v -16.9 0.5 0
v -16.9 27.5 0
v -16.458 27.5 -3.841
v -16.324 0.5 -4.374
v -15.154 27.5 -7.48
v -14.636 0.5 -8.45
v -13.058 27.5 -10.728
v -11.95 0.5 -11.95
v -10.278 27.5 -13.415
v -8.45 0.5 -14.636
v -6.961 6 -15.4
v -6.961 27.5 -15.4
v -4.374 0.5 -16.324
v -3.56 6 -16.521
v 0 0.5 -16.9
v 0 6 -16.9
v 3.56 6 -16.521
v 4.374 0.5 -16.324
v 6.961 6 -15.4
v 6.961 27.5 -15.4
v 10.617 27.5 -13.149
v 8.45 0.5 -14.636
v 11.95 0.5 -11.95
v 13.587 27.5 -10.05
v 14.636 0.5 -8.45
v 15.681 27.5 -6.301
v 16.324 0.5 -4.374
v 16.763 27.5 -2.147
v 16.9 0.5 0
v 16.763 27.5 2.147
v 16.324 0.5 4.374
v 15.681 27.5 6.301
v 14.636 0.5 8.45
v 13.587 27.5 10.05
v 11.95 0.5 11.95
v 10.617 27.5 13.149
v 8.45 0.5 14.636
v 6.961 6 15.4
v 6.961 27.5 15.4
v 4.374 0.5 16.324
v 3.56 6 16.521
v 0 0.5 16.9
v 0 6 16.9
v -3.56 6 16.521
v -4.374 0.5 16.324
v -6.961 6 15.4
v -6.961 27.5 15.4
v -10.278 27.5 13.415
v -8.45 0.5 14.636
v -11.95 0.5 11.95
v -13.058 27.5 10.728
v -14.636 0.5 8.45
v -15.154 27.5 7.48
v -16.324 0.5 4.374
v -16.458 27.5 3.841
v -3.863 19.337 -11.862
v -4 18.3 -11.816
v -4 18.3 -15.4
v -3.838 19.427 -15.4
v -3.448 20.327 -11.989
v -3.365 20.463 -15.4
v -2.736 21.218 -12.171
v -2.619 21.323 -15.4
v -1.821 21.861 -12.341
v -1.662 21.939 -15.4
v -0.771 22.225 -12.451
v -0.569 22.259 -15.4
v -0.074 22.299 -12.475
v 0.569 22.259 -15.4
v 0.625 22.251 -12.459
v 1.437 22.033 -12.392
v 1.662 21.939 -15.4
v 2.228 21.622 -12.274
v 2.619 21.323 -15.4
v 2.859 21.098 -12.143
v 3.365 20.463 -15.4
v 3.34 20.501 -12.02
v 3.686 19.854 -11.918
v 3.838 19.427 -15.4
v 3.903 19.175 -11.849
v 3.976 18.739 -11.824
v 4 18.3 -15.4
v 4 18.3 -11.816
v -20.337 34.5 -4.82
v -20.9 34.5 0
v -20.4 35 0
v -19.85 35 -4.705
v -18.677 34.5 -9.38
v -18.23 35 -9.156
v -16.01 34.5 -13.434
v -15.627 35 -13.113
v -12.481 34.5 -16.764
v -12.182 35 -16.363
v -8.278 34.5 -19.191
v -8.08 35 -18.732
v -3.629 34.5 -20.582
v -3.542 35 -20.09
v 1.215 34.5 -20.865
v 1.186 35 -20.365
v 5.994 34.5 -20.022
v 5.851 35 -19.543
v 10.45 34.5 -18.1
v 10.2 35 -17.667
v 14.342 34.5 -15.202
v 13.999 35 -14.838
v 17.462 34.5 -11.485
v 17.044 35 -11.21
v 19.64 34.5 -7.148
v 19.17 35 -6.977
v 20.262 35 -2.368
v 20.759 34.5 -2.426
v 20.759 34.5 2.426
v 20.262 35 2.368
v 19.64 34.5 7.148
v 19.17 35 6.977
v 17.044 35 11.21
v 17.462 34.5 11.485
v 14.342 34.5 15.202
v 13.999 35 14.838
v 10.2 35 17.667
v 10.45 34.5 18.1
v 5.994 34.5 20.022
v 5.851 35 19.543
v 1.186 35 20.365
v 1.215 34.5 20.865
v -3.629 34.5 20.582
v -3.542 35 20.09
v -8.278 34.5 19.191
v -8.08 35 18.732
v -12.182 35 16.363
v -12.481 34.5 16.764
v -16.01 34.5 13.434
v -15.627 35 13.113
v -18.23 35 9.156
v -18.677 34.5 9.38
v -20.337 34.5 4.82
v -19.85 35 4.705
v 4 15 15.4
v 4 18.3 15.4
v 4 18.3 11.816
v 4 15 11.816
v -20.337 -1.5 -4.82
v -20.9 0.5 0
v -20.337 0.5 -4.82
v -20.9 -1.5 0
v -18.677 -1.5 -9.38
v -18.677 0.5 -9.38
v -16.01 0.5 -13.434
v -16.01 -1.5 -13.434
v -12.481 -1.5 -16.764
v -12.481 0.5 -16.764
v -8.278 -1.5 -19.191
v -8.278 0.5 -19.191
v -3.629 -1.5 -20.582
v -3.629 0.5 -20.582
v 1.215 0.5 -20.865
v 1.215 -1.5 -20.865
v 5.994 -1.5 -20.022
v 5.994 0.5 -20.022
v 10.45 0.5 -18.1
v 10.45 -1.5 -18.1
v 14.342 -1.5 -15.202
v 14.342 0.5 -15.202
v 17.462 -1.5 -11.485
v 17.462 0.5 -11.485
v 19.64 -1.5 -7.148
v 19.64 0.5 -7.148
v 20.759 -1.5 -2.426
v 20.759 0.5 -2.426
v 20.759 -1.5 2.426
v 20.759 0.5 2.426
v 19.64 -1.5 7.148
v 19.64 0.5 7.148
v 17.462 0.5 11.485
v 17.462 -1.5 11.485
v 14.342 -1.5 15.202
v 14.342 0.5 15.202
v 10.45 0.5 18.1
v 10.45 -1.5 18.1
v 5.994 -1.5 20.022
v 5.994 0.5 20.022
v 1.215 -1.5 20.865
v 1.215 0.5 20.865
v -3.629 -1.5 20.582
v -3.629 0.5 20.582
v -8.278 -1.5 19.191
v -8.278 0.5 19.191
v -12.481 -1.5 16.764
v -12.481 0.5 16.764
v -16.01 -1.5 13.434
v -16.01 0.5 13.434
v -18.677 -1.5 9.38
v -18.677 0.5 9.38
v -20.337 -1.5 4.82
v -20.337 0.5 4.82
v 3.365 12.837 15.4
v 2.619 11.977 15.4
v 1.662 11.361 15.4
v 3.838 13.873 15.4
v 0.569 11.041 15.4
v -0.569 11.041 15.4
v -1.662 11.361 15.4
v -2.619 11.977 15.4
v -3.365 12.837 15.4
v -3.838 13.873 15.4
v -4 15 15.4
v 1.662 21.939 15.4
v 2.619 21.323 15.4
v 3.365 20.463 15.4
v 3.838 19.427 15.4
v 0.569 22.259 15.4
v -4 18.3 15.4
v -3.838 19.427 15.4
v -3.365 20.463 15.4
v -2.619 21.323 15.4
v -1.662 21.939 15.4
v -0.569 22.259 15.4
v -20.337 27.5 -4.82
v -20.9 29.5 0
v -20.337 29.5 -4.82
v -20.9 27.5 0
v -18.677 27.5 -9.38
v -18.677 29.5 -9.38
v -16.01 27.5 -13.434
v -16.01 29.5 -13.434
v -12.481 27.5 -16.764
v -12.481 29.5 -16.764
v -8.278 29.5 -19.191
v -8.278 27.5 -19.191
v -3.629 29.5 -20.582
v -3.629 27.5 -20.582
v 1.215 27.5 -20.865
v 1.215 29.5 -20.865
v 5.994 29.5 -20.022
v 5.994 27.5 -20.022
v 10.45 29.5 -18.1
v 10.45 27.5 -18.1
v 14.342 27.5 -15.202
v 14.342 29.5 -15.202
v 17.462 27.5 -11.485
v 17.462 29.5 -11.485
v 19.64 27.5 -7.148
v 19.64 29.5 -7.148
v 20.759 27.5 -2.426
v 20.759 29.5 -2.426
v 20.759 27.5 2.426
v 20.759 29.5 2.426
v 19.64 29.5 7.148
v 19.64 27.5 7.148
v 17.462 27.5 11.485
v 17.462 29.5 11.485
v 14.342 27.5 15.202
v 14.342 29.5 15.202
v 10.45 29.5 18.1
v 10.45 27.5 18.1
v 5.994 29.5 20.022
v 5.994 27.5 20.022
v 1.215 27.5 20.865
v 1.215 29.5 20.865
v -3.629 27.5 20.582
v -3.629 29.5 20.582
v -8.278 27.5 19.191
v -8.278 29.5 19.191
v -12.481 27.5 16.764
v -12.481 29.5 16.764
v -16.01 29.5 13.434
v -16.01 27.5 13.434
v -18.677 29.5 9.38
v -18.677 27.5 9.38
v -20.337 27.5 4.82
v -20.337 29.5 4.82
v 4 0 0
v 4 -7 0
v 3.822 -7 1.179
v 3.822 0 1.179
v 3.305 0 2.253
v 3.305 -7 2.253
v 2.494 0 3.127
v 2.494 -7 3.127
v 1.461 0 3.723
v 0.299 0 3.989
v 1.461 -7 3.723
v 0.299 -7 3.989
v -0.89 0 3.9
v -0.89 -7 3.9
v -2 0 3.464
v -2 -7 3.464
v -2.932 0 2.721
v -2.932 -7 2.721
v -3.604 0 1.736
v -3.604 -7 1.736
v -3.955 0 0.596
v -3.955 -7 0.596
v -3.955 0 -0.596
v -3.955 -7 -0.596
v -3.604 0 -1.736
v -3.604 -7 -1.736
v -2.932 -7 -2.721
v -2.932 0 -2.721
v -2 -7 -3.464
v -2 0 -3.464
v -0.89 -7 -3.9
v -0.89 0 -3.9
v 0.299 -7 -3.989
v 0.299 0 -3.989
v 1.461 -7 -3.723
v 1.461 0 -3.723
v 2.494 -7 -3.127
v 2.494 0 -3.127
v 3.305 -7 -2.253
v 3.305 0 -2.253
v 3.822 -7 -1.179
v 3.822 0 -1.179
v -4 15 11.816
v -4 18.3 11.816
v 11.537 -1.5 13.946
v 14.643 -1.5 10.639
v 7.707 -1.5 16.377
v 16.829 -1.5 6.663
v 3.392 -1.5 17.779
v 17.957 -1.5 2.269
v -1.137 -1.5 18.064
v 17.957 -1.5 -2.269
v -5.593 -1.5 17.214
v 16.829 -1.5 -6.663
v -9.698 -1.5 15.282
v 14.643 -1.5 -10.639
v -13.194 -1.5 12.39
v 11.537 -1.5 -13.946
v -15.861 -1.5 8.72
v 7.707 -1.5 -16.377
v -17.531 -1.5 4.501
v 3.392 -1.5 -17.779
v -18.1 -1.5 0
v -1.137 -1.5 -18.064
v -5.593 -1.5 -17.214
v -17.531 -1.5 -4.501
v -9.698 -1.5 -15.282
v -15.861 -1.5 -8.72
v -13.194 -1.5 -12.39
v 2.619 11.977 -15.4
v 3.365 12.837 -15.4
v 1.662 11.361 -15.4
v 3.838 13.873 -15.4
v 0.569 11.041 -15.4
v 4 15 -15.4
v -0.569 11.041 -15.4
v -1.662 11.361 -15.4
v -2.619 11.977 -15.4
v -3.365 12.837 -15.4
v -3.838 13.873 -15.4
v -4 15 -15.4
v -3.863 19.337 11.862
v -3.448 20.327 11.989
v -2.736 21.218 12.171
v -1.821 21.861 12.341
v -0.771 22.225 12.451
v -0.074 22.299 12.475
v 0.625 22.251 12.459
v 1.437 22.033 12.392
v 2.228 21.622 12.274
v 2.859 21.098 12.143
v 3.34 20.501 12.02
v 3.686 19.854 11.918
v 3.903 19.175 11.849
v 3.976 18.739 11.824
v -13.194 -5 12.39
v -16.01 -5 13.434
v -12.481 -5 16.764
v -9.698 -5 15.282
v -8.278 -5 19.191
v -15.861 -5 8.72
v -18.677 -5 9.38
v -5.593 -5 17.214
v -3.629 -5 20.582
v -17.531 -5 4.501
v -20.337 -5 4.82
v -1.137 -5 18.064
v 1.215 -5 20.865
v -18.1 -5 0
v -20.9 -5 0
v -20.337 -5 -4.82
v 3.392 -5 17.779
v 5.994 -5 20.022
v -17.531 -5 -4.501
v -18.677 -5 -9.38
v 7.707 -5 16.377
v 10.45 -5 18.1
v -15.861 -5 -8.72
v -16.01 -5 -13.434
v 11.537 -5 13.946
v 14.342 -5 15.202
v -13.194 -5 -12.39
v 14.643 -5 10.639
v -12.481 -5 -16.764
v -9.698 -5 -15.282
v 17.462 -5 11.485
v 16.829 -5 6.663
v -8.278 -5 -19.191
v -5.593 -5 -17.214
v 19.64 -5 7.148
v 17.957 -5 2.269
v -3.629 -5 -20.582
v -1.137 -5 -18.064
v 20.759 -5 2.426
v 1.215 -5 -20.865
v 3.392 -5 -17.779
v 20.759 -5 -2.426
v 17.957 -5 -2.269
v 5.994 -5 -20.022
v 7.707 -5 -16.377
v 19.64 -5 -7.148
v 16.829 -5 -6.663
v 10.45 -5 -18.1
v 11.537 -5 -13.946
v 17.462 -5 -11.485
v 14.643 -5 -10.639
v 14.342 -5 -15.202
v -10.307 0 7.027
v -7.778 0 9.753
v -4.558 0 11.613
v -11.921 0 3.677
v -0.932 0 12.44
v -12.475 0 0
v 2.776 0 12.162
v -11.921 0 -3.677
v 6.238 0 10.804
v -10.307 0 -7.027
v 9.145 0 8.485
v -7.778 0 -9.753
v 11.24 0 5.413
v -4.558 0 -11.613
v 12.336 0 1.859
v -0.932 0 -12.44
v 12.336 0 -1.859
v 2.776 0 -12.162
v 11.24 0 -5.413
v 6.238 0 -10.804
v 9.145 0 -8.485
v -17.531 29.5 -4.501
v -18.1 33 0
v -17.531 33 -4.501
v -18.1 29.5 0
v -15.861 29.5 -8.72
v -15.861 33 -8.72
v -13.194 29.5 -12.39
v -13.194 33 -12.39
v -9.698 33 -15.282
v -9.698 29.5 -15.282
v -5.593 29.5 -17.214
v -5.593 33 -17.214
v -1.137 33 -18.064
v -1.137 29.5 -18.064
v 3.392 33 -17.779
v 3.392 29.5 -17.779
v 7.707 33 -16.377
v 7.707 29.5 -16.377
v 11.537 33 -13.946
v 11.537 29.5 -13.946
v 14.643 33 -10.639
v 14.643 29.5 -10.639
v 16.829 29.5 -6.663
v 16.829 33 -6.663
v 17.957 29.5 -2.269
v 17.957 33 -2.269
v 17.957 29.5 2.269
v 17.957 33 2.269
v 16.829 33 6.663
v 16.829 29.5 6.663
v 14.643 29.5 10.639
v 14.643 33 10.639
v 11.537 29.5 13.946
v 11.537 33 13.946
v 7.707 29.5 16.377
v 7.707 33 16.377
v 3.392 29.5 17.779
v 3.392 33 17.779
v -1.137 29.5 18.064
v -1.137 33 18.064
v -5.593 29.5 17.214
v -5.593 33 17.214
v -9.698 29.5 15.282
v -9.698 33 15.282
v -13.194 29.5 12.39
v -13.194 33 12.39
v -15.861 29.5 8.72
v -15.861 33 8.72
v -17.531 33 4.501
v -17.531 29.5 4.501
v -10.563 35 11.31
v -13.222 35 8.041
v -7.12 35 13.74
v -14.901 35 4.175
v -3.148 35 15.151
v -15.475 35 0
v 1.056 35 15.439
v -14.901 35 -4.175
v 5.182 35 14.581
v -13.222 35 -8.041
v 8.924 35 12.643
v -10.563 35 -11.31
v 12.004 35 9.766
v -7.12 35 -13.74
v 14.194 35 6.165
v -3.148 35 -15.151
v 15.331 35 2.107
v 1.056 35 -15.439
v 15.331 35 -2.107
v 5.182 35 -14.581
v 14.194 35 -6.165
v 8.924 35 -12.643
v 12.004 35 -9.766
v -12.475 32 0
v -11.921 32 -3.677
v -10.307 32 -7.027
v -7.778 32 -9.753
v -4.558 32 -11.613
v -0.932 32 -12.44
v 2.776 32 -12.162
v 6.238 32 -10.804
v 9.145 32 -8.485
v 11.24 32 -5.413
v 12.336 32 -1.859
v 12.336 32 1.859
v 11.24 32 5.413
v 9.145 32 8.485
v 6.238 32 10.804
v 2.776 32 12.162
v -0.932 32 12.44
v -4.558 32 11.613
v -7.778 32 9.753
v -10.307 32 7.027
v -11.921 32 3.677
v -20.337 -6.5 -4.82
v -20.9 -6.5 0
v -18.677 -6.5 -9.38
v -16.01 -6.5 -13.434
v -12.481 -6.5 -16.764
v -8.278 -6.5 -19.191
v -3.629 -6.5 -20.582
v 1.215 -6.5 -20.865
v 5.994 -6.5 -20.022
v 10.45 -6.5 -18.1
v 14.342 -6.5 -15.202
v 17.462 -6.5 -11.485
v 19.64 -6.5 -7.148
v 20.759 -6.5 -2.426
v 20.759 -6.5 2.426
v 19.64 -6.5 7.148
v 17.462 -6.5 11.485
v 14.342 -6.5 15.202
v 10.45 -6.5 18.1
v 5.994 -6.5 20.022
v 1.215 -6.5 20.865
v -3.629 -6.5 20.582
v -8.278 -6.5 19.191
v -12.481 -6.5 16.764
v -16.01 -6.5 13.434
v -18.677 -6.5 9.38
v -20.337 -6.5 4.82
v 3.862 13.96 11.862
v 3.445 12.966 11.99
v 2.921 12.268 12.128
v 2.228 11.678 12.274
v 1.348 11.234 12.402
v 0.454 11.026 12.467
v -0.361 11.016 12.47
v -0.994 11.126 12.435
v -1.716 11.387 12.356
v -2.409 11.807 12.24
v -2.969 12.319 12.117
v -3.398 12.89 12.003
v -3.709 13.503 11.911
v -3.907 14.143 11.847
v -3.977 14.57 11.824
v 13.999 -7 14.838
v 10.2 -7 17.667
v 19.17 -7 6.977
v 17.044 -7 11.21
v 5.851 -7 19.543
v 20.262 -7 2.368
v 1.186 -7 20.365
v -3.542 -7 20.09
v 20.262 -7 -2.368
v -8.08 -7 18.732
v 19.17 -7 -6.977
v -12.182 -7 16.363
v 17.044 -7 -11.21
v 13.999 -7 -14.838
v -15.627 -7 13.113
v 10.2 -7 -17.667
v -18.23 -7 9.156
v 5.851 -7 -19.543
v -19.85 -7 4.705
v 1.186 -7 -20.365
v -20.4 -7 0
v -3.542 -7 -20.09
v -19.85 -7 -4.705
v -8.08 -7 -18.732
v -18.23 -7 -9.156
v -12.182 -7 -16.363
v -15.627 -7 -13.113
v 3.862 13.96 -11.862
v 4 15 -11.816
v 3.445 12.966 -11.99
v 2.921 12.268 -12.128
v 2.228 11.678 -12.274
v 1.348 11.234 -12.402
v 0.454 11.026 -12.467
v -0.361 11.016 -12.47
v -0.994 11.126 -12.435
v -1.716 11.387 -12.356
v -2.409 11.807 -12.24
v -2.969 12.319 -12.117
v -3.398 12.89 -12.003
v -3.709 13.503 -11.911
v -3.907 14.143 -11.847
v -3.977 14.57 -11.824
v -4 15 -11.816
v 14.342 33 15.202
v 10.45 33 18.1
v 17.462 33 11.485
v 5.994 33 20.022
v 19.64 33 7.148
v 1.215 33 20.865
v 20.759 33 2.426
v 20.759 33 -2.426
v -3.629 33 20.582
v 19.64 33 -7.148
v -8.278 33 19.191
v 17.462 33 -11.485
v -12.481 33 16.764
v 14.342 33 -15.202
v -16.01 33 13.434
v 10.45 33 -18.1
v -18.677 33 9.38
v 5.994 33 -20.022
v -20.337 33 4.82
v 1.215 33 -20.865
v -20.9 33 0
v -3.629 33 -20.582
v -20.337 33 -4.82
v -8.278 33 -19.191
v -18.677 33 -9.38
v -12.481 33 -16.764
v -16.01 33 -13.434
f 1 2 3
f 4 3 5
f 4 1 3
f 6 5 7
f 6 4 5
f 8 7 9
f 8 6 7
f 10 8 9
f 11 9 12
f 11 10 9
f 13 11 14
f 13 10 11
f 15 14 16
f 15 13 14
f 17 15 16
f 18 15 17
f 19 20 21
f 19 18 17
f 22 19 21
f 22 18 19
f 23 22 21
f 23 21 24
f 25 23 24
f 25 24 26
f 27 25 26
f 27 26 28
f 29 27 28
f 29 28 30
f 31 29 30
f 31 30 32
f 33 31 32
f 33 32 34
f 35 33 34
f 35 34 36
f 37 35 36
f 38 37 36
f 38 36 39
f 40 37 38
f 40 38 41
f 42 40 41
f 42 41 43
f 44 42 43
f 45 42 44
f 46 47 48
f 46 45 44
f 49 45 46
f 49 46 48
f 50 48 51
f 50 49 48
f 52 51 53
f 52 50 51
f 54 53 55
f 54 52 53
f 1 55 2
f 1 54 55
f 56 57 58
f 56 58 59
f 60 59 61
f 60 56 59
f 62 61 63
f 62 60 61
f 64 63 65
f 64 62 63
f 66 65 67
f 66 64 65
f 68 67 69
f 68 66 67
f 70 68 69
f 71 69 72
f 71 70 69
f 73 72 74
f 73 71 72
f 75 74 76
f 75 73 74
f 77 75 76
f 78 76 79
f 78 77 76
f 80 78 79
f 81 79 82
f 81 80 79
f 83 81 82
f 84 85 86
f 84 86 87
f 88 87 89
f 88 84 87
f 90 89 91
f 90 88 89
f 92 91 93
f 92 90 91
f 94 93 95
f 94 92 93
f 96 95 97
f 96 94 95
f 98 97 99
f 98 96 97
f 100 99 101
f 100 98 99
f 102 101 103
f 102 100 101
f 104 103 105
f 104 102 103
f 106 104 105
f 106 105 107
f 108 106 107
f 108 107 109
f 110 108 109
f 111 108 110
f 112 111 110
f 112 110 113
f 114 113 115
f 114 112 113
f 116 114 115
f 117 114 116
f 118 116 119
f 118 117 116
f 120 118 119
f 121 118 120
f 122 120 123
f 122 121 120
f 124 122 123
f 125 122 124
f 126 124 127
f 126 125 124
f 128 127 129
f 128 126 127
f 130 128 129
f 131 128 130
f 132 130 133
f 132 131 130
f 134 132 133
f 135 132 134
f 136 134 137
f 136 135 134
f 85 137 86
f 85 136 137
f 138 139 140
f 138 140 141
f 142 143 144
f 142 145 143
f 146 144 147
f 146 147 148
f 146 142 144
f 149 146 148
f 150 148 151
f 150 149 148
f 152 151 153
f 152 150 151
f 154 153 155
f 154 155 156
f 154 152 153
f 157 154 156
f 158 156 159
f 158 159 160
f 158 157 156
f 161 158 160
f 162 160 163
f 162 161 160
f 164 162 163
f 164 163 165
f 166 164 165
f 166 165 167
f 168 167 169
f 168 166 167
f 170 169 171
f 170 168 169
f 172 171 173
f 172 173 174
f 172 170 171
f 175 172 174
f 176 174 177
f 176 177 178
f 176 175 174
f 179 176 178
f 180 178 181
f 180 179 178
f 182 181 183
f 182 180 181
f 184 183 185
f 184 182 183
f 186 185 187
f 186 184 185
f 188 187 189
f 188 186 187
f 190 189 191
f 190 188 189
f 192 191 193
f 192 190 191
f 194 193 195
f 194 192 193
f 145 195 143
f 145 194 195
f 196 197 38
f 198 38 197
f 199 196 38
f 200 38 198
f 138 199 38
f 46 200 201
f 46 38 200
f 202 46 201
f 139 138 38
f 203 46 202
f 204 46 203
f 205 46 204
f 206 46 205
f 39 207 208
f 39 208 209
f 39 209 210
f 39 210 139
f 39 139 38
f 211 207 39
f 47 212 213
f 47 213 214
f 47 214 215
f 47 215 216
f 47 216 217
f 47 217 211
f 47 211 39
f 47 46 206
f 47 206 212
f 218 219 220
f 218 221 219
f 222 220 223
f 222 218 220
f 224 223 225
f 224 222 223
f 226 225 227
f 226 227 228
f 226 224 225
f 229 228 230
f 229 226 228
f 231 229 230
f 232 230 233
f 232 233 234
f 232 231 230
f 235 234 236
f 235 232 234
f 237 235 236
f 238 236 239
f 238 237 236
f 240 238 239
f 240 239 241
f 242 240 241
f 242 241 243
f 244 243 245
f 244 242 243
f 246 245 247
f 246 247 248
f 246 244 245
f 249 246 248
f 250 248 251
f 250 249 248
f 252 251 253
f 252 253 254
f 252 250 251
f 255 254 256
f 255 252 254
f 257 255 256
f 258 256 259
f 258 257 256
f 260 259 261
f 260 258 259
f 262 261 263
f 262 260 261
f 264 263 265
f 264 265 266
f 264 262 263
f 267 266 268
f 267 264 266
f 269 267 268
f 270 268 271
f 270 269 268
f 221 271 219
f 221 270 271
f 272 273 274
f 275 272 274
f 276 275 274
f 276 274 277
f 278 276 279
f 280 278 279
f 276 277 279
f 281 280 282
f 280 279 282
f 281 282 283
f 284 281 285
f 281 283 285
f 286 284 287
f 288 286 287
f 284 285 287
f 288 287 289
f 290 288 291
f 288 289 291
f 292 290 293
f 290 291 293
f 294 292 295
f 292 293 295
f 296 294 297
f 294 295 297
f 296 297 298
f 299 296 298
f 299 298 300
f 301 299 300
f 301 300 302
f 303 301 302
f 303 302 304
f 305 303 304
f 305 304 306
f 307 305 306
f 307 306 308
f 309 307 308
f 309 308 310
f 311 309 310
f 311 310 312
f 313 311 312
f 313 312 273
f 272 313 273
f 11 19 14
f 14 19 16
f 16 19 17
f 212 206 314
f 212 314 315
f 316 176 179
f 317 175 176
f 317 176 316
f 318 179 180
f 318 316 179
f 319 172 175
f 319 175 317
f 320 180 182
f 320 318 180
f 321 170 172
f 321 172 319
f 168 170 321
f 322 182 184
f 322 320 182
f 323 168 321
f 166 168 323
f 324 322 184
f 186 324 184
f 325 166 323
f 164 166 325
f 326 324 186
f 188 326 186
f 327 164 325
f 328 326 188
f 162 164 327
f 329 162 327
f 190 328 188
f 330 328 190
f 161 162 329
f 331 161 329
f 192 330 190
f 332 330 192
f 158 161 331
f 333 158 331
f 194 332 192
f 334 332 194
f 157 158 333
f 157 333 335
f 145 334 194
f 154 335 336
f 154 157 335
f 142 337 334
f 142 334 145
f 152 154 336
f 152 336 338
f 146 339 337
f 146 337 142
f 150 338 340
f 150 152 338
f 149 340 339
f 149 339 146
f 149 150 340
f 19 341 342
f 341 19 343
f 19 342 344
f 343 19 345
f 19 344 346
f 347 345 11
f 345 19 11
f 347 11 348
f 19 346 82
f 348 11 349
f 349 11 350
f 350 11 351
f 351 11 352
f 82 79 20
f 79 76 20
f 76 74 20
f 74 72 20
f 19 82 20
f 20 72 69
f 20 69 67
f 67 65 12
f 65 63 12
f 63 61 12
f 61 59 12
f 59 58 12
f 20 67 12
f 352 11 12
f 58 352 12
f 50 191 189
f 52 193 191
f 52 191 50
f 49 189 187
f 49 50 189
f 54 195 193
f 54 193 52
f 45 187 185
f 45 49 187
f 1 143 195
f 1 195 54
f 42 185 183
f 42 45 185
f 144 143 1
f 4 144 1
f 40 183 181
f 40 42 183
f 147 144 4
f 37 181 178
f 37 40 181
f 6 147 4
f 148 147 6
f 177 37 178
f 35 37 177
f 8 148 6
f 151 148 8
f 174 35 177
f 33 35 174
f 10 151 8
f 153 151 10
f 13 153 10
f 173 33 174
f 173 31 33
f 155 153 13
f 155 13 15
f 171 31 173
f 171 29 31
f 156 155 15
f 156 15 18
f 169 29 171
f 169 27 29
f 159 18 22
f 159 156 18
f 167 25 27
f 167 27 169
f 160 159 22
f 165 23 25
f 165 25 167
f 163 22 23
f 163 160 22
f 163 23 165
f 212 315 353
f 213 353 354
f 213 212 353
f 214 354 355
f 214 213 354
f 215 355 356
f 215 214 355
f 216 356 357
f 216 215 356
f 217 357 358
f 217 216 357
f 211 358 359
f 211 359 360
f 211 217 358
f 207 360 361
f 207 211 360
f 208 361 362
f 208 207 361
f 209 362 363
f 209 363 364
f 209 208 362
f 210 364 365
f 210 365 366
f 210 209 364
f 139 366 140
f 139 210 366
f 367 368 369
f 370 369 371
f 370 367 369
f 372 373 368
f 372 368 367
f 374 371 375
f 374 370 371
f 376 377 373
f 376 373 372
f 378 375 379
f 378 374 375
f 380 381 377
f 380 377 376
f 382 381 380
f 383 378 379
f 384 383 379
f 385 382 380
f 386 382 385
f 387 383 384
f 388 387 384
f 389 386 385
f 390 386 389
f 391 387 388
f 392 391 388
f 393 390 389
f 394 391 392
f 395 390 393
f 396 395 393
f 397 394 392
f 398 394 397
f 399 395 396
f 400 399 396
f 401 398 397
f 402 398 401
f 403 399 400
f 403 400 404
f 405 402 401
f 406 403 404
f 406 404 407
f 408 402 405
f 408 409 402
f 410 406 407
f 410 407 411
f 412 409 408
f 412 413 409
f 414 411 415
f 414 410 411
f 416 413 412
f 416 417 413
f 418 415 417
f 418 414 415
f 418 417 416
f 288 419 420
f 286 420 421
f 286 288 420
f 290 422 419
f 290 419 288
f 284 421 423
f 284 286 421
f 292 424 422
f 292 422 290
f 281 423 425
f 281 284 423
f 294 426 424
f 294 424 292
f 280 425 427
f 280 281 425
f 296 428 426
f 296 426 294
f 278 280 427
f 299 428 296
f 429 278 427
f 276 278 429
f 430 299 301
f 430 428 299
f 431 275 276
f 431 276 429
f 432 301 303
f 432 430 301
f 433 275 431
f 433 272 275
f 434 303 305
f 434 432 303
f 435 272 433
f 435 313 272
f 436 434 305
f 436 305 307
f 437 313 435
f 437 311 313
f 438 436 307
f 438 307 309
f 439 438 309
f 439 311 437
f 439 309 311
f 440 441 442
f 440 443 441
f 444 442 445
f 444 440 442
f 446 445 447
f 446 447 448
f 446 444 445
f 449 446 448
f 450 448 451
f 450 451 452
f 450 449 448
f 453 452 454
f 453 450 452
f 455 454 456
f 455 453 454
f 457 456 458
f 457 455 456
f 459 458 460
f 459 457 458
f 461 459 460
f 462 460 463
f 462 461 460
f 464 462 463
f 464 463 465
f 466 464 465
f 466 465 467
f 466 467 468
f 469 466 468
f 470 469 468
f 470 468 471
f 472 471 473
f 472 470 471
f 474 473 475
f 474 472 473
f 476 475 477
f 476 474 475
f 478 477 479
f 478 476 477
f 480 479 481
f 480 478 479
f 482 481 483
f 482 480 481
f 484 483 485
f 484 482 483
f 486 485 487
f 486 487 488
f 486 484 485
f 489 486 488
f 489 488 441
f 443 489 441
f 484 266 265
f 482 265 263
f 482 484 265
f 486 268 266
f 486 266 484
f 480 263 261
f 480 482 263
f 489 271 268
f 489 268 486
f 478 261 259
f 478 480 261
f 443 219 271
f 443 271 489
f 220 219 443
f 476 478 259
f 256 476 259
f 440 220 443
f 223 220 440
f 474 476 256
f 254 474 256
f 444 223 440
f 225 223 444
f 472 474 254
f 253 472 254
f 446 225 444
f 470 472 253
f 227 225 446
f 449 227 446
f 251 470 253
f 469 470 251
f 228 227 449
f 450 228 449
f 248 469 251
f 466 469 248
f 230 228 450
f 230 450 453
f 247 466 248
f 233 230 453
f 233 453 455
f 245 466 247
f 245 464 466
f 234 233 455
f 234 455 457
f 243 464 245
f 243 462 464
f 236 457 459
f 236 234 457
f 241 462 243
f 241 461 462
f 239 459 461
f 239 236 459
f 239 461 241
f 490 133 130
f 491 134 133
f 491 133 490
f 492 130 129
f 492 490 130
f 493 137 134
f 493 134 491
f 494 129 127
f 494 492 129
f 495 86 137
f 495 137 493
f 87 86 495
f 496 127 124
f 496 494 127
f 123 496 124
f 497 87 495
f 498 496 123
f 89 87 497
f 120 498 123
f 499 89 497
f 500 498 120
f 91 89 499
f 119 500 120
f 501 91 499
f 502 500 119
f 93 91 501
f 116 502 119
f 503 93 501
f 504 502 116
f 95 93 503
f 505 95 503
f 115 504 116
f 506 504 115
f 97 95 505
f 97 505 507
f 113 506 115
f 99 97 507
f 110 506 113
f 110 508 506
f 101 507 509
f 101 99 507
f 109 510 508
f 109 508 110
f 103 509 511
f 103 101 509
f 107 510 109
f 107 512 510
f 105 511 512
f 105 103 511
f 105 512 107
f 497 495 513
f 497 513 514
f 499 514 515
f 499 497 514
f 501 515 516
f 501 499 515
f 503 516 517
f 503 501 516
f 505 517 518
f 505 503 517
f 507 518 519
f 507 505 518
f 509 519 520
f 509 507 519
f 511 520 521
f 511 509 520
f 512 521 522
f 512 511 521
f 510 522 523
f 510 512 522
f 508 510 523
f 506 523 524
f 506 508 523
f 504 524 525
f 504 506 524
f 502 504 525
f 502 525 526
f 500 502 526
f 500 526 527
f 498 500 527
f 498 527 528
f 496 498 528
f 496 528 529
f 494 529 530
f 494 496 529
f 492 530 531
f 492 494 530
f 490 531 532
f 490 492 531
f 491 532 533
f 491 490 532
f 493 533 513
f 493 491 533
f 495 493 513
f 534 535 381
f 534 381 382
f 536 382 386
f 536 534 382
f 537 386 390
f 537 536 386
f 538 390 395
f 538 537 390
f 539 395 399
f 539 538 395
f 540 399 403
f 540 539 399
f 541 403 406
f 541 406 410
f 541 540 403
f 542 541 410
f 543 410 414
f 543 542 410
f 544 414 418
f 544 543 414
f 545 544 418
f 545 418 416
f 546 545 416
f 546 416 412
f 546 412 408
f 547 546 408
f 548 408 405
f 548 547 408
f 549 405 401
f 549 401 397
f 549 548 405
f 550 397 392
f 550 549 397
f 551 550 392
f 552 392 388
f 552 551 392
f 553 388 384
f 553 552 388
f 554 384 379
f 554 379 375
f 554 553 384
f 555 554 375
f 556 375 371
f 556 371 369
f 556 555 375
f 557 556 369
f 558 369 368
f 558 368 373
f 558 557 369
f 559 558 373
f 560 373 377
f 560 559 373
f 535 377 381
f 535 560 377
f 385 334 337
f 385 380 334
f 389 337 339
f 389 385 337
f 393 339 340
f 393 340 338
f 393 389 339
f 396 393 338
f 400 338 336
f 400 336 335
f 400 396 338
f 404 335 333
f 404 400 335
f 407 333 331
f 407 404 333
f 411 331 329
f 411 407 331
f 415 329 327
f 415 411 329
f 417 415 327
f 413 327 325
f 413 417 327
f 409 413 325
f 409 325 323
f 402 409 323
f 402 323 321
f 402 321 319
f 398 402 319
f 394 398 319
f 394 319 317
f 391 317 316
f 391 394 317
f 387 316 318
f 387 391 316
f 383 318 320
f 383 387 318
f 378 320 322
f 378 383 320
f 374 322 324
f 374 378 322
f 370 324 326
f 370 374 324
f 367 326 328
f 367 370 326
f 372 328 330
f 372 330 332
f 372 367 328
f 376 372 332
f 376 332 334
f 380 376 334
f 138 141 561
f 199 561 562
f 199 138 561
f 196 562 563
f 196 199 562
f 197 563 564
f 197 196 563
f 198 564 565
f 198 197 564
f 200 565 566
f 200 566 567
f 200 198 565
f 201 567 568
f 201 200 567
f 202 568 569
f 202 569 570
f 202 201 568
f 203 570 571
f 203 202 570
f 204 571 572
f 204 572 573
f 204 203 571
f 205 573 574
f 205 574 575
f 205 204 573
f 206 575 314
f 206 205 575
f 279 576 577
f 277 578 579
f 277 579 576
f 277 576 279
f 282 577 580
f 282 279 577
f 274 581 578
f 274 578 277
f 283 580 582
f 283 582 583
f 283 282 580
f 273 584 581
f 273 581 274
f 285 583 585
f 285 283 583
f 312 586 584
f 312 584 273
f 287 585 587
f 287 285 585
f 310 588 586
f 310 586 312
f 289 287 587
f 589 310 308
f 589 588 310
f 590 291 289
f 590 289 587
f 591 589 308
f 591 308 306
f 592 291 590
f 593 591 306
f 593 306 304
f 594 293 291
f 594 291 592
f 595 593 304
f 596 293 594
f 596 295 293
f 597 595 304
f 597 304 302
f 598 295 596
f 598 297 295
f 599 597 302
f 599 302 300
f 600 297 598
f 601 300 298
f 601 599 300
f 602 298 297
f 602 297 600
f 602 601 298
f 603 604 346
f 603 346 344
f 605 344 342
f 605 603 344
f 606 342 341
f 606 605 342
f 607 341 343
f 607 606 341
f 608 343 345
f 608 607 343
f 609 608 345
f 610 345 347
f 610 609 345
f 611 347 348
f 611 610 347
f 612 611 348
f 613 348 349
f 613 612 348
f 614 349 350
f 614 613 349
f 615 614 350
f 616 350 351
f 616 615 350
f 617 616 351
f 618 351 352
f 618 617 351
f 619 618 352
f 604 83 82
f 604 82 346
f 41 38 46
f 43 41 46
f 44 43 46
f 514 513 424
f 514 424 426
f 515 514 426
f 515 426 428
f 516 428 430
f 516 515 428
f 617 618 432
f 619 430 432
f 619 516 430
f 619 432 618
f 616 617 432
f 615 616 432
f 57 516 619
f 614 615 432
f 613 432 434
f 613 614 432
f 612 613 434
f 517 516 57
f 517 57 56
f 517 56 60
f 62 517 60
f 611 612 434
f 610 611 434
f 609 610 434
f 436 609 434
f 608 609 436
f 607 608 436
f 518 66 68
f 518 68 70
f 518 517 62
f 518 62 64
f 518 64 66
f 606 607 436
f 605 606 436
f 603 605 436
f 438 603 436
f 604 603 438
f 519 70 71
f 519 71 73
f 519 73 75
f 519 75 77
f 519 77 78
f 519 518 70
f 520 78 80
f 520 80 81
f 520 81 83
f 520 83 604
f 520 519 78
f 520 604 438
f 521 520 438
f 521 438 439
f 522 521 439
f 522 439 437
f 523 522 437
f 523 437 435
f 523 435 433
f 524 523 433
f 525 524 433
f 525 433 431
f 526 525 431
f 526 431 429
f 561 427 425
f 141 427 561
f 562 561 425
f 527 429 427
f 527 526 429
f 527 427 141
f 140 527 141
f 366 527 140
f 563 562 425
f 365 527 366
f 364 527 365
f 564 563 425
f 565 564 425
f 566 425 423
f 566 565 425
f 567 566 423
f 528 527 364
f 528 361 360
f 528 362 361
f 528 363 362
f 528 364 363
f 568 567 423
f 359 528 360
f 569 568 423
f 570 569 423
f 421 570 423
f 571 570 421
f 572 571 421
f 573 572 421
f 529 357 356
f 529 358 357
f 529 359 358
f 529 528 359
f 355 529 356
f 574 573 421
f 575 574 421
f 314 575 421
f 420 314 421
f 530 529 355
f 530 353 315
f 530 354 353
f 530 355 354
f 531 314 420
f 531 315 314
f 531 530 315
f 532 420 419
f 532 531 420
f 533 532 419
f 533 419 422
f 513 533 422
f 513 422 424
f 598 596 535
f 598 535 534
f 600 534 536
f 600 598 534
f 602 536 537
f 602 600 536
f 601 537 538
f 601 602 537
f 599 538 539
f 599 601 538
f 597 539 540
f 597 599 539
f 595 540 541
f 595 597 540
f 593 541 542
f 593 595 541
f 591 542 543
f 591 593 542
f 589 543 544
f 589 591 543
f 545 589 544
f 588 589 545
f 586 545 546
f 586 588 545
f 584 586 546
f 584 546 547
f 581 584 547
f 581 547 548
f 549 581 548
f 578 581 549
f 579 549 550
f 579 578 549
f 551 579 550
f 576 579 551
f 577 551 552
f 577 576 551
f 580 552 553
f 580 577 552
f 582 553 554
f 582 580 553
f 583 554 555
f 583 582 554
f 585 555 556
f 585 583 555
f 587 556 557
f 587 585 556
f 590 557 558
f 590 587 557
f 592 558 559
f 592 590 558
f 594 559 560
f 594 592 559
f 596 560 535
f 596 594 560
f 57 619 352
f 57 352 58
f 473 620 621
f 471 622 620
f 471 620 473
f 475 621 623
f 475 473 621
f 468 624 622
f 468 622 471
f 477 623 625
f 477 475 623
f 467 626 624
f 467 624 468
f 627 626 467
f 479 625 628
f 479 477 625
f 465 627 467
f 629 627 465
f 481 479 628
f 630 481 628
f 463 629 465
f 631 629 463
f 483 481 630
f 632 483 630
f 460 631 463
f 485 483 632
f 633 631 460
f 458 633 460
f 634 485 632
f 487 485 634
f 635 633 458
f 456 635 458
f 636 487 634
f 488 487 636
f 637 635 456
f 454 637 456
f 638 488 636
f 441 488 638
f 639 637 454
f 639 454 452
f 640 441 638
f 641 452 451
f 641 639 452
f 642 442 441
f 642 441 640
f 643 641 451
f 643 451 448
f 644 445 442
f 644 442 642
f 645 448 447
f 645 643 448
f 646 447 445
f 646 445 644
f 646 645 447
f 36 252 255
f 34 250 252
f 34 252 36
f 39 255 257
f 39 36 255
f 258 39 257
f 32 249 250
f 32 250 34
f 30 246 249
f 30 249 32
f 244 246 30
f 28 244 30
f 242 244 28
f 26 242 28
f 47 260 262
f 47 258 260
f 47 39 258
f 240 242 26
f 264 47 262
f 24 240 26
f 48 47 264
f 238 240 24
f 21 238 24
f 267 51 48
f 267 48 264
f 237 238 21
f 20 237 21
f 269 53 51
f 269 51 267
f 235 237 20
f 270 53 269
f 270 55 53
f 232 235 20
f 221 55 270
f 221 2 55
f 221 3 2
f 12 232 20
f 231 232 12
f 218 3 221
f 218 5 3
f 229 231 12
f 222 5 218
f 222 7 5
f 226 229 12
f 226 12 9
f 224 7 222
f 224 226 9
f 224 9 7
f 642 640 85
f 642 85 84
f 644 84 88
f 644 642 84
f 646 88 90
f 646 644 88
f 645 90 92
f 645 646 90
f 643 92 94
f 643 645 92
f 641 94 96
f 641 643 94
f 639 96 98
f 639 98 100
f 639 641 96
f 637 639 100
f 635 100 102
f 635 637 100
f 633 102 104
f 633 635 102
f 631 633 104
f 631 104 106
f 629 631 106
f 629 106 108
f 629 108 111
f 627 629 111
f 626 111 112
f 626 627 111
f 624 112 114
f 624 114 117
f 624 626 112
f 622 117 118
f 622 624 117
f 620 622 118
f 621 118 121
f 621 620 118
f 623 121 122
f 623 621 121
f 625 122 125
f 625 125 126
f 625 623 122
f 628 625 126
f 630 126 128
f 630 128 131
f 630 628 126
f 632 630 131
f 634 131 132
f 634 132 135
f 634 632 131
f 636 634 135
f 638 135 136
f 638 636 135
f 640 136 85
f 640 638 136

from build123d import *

# Parameters (mm, degrees)
CHAMFER1_SIZE           = 3
CHAMFER2_SIZE           = 0.5
SKETCH2_R               = 4
CUT_EXTRUDE1_DEPTH      = 43
SKETCH3_W               = 1.5
SKETCH3_H               = 21.5
CUT_EXTRUDE2_DEPTH      = 21.9
CUT_EXTRUDE2_DEPTH_BACK = 21.9
CUT_EXTRUDE3_DEPTH      = 6.5
CUT_EXTRUDE3_DEPTH_BACK = 37.3


with BuildPart() as part:
    # Sketch1 → Revolve1 (revolve)
    with BuildSketch(Plane.XY, mode=Mode.PRIVATE) as revolve1_sk:
        Polygon((0, 0), (12.475, 0), (12.475, 35), (20.9, 35), (20.9, 33), (18.1, 33), (18.1, 29.5), (20.9, 29.5), (20.9, 27.5), (16.9, 27.5), (16.9, 0.5), (20.9, 0.5), (20.9, -1.5), (18.1, -1.5), (18.1, -5), (20.9, -5), (20.9, -7), (0, -7), align=None)
    revolve(revolve1_sk.sketch.rotate(Axis((0, 0, 0), (0, -1, 0)), 180), axis=Axis((0, 0, 0), (0, -1, 0)))  # turned: the seam where the file's is

    # Chamfer1
    chamfer1_edges = [part.edges().sort_by_distance(p)[0] for p in [
        (12.475, 35, 0),
    ]]
    chamfer(chamfer1_edges, length=CHAMFER1_SIZE)

    # Chamfer2
    chamfer2_edges = [part.edges().sort_by_distance(p)[0] for p in [
        (20.9, 35, 0),
        (20.9, -7, 0),
    ]]
    chamfer(chamfer2_edges, length=CHAMFER2_SIZE)

    # Sketch2 → Cut-Extrude1 (cut, through all)
    with BuildSketch(Plane.XZ.offset(7)):
        Circle(SKETCH2_R)
    extrude(amount=-CUT_EXTRUDE1_DEPTH, mode=Mode.SUBTRACT)

    # Sketch3 → Cut-Extrude2 (cut, two sides)
    with BuildSketch(Plane(origin=(0, 0, 0), x_dir=(0, 0, -1), z_dir=(1, 0, 0))) as cut_extrude2_sk:
        with Locations((16.15, 16.75)):
            Rectangle(SKETCH3_W, SKETCH3_H)
        with Locations((-16.15, 16.75)):
            Rectangle(SKETCH3_W, SKETCH3_H)
    extrude(amount=CUT_EXTRUDE2_DEPTH, mode=Mode.SUBTRACT)
    extrude(cut_extrude2_sk.sketch, amount=-CUT_EXTRUDE2_DEPTH_BACK, mode=Mode.SUBTRACT)

    # Sketch4 → Cut-Extrude3 (cut, two sides)
    with BuildSketch(Plane.XY.offset(15.4)) as cut_extrude3_sk:
        with BuildLine():
            Line((4, 18.3), (4, 15))
            ThreePointArc((4, 15), (0, 11), (-4, 15))
            Line((-4, 15), (-4, 18.3))
            ThreePointArc((-4, 18.3), (0, 22.3), (4, 18.3))
        make_face()
    extrude(amount=CUT_EXTRUDE3_DEPTH, mode=Mode.SUBTRACT)
    extrude(cut_extrude3_sk.sketch, amount=-CUT_EXTRUDE3_DEPTH_BACK, mode=Mode.SUBTRACT)


solid = part.part
